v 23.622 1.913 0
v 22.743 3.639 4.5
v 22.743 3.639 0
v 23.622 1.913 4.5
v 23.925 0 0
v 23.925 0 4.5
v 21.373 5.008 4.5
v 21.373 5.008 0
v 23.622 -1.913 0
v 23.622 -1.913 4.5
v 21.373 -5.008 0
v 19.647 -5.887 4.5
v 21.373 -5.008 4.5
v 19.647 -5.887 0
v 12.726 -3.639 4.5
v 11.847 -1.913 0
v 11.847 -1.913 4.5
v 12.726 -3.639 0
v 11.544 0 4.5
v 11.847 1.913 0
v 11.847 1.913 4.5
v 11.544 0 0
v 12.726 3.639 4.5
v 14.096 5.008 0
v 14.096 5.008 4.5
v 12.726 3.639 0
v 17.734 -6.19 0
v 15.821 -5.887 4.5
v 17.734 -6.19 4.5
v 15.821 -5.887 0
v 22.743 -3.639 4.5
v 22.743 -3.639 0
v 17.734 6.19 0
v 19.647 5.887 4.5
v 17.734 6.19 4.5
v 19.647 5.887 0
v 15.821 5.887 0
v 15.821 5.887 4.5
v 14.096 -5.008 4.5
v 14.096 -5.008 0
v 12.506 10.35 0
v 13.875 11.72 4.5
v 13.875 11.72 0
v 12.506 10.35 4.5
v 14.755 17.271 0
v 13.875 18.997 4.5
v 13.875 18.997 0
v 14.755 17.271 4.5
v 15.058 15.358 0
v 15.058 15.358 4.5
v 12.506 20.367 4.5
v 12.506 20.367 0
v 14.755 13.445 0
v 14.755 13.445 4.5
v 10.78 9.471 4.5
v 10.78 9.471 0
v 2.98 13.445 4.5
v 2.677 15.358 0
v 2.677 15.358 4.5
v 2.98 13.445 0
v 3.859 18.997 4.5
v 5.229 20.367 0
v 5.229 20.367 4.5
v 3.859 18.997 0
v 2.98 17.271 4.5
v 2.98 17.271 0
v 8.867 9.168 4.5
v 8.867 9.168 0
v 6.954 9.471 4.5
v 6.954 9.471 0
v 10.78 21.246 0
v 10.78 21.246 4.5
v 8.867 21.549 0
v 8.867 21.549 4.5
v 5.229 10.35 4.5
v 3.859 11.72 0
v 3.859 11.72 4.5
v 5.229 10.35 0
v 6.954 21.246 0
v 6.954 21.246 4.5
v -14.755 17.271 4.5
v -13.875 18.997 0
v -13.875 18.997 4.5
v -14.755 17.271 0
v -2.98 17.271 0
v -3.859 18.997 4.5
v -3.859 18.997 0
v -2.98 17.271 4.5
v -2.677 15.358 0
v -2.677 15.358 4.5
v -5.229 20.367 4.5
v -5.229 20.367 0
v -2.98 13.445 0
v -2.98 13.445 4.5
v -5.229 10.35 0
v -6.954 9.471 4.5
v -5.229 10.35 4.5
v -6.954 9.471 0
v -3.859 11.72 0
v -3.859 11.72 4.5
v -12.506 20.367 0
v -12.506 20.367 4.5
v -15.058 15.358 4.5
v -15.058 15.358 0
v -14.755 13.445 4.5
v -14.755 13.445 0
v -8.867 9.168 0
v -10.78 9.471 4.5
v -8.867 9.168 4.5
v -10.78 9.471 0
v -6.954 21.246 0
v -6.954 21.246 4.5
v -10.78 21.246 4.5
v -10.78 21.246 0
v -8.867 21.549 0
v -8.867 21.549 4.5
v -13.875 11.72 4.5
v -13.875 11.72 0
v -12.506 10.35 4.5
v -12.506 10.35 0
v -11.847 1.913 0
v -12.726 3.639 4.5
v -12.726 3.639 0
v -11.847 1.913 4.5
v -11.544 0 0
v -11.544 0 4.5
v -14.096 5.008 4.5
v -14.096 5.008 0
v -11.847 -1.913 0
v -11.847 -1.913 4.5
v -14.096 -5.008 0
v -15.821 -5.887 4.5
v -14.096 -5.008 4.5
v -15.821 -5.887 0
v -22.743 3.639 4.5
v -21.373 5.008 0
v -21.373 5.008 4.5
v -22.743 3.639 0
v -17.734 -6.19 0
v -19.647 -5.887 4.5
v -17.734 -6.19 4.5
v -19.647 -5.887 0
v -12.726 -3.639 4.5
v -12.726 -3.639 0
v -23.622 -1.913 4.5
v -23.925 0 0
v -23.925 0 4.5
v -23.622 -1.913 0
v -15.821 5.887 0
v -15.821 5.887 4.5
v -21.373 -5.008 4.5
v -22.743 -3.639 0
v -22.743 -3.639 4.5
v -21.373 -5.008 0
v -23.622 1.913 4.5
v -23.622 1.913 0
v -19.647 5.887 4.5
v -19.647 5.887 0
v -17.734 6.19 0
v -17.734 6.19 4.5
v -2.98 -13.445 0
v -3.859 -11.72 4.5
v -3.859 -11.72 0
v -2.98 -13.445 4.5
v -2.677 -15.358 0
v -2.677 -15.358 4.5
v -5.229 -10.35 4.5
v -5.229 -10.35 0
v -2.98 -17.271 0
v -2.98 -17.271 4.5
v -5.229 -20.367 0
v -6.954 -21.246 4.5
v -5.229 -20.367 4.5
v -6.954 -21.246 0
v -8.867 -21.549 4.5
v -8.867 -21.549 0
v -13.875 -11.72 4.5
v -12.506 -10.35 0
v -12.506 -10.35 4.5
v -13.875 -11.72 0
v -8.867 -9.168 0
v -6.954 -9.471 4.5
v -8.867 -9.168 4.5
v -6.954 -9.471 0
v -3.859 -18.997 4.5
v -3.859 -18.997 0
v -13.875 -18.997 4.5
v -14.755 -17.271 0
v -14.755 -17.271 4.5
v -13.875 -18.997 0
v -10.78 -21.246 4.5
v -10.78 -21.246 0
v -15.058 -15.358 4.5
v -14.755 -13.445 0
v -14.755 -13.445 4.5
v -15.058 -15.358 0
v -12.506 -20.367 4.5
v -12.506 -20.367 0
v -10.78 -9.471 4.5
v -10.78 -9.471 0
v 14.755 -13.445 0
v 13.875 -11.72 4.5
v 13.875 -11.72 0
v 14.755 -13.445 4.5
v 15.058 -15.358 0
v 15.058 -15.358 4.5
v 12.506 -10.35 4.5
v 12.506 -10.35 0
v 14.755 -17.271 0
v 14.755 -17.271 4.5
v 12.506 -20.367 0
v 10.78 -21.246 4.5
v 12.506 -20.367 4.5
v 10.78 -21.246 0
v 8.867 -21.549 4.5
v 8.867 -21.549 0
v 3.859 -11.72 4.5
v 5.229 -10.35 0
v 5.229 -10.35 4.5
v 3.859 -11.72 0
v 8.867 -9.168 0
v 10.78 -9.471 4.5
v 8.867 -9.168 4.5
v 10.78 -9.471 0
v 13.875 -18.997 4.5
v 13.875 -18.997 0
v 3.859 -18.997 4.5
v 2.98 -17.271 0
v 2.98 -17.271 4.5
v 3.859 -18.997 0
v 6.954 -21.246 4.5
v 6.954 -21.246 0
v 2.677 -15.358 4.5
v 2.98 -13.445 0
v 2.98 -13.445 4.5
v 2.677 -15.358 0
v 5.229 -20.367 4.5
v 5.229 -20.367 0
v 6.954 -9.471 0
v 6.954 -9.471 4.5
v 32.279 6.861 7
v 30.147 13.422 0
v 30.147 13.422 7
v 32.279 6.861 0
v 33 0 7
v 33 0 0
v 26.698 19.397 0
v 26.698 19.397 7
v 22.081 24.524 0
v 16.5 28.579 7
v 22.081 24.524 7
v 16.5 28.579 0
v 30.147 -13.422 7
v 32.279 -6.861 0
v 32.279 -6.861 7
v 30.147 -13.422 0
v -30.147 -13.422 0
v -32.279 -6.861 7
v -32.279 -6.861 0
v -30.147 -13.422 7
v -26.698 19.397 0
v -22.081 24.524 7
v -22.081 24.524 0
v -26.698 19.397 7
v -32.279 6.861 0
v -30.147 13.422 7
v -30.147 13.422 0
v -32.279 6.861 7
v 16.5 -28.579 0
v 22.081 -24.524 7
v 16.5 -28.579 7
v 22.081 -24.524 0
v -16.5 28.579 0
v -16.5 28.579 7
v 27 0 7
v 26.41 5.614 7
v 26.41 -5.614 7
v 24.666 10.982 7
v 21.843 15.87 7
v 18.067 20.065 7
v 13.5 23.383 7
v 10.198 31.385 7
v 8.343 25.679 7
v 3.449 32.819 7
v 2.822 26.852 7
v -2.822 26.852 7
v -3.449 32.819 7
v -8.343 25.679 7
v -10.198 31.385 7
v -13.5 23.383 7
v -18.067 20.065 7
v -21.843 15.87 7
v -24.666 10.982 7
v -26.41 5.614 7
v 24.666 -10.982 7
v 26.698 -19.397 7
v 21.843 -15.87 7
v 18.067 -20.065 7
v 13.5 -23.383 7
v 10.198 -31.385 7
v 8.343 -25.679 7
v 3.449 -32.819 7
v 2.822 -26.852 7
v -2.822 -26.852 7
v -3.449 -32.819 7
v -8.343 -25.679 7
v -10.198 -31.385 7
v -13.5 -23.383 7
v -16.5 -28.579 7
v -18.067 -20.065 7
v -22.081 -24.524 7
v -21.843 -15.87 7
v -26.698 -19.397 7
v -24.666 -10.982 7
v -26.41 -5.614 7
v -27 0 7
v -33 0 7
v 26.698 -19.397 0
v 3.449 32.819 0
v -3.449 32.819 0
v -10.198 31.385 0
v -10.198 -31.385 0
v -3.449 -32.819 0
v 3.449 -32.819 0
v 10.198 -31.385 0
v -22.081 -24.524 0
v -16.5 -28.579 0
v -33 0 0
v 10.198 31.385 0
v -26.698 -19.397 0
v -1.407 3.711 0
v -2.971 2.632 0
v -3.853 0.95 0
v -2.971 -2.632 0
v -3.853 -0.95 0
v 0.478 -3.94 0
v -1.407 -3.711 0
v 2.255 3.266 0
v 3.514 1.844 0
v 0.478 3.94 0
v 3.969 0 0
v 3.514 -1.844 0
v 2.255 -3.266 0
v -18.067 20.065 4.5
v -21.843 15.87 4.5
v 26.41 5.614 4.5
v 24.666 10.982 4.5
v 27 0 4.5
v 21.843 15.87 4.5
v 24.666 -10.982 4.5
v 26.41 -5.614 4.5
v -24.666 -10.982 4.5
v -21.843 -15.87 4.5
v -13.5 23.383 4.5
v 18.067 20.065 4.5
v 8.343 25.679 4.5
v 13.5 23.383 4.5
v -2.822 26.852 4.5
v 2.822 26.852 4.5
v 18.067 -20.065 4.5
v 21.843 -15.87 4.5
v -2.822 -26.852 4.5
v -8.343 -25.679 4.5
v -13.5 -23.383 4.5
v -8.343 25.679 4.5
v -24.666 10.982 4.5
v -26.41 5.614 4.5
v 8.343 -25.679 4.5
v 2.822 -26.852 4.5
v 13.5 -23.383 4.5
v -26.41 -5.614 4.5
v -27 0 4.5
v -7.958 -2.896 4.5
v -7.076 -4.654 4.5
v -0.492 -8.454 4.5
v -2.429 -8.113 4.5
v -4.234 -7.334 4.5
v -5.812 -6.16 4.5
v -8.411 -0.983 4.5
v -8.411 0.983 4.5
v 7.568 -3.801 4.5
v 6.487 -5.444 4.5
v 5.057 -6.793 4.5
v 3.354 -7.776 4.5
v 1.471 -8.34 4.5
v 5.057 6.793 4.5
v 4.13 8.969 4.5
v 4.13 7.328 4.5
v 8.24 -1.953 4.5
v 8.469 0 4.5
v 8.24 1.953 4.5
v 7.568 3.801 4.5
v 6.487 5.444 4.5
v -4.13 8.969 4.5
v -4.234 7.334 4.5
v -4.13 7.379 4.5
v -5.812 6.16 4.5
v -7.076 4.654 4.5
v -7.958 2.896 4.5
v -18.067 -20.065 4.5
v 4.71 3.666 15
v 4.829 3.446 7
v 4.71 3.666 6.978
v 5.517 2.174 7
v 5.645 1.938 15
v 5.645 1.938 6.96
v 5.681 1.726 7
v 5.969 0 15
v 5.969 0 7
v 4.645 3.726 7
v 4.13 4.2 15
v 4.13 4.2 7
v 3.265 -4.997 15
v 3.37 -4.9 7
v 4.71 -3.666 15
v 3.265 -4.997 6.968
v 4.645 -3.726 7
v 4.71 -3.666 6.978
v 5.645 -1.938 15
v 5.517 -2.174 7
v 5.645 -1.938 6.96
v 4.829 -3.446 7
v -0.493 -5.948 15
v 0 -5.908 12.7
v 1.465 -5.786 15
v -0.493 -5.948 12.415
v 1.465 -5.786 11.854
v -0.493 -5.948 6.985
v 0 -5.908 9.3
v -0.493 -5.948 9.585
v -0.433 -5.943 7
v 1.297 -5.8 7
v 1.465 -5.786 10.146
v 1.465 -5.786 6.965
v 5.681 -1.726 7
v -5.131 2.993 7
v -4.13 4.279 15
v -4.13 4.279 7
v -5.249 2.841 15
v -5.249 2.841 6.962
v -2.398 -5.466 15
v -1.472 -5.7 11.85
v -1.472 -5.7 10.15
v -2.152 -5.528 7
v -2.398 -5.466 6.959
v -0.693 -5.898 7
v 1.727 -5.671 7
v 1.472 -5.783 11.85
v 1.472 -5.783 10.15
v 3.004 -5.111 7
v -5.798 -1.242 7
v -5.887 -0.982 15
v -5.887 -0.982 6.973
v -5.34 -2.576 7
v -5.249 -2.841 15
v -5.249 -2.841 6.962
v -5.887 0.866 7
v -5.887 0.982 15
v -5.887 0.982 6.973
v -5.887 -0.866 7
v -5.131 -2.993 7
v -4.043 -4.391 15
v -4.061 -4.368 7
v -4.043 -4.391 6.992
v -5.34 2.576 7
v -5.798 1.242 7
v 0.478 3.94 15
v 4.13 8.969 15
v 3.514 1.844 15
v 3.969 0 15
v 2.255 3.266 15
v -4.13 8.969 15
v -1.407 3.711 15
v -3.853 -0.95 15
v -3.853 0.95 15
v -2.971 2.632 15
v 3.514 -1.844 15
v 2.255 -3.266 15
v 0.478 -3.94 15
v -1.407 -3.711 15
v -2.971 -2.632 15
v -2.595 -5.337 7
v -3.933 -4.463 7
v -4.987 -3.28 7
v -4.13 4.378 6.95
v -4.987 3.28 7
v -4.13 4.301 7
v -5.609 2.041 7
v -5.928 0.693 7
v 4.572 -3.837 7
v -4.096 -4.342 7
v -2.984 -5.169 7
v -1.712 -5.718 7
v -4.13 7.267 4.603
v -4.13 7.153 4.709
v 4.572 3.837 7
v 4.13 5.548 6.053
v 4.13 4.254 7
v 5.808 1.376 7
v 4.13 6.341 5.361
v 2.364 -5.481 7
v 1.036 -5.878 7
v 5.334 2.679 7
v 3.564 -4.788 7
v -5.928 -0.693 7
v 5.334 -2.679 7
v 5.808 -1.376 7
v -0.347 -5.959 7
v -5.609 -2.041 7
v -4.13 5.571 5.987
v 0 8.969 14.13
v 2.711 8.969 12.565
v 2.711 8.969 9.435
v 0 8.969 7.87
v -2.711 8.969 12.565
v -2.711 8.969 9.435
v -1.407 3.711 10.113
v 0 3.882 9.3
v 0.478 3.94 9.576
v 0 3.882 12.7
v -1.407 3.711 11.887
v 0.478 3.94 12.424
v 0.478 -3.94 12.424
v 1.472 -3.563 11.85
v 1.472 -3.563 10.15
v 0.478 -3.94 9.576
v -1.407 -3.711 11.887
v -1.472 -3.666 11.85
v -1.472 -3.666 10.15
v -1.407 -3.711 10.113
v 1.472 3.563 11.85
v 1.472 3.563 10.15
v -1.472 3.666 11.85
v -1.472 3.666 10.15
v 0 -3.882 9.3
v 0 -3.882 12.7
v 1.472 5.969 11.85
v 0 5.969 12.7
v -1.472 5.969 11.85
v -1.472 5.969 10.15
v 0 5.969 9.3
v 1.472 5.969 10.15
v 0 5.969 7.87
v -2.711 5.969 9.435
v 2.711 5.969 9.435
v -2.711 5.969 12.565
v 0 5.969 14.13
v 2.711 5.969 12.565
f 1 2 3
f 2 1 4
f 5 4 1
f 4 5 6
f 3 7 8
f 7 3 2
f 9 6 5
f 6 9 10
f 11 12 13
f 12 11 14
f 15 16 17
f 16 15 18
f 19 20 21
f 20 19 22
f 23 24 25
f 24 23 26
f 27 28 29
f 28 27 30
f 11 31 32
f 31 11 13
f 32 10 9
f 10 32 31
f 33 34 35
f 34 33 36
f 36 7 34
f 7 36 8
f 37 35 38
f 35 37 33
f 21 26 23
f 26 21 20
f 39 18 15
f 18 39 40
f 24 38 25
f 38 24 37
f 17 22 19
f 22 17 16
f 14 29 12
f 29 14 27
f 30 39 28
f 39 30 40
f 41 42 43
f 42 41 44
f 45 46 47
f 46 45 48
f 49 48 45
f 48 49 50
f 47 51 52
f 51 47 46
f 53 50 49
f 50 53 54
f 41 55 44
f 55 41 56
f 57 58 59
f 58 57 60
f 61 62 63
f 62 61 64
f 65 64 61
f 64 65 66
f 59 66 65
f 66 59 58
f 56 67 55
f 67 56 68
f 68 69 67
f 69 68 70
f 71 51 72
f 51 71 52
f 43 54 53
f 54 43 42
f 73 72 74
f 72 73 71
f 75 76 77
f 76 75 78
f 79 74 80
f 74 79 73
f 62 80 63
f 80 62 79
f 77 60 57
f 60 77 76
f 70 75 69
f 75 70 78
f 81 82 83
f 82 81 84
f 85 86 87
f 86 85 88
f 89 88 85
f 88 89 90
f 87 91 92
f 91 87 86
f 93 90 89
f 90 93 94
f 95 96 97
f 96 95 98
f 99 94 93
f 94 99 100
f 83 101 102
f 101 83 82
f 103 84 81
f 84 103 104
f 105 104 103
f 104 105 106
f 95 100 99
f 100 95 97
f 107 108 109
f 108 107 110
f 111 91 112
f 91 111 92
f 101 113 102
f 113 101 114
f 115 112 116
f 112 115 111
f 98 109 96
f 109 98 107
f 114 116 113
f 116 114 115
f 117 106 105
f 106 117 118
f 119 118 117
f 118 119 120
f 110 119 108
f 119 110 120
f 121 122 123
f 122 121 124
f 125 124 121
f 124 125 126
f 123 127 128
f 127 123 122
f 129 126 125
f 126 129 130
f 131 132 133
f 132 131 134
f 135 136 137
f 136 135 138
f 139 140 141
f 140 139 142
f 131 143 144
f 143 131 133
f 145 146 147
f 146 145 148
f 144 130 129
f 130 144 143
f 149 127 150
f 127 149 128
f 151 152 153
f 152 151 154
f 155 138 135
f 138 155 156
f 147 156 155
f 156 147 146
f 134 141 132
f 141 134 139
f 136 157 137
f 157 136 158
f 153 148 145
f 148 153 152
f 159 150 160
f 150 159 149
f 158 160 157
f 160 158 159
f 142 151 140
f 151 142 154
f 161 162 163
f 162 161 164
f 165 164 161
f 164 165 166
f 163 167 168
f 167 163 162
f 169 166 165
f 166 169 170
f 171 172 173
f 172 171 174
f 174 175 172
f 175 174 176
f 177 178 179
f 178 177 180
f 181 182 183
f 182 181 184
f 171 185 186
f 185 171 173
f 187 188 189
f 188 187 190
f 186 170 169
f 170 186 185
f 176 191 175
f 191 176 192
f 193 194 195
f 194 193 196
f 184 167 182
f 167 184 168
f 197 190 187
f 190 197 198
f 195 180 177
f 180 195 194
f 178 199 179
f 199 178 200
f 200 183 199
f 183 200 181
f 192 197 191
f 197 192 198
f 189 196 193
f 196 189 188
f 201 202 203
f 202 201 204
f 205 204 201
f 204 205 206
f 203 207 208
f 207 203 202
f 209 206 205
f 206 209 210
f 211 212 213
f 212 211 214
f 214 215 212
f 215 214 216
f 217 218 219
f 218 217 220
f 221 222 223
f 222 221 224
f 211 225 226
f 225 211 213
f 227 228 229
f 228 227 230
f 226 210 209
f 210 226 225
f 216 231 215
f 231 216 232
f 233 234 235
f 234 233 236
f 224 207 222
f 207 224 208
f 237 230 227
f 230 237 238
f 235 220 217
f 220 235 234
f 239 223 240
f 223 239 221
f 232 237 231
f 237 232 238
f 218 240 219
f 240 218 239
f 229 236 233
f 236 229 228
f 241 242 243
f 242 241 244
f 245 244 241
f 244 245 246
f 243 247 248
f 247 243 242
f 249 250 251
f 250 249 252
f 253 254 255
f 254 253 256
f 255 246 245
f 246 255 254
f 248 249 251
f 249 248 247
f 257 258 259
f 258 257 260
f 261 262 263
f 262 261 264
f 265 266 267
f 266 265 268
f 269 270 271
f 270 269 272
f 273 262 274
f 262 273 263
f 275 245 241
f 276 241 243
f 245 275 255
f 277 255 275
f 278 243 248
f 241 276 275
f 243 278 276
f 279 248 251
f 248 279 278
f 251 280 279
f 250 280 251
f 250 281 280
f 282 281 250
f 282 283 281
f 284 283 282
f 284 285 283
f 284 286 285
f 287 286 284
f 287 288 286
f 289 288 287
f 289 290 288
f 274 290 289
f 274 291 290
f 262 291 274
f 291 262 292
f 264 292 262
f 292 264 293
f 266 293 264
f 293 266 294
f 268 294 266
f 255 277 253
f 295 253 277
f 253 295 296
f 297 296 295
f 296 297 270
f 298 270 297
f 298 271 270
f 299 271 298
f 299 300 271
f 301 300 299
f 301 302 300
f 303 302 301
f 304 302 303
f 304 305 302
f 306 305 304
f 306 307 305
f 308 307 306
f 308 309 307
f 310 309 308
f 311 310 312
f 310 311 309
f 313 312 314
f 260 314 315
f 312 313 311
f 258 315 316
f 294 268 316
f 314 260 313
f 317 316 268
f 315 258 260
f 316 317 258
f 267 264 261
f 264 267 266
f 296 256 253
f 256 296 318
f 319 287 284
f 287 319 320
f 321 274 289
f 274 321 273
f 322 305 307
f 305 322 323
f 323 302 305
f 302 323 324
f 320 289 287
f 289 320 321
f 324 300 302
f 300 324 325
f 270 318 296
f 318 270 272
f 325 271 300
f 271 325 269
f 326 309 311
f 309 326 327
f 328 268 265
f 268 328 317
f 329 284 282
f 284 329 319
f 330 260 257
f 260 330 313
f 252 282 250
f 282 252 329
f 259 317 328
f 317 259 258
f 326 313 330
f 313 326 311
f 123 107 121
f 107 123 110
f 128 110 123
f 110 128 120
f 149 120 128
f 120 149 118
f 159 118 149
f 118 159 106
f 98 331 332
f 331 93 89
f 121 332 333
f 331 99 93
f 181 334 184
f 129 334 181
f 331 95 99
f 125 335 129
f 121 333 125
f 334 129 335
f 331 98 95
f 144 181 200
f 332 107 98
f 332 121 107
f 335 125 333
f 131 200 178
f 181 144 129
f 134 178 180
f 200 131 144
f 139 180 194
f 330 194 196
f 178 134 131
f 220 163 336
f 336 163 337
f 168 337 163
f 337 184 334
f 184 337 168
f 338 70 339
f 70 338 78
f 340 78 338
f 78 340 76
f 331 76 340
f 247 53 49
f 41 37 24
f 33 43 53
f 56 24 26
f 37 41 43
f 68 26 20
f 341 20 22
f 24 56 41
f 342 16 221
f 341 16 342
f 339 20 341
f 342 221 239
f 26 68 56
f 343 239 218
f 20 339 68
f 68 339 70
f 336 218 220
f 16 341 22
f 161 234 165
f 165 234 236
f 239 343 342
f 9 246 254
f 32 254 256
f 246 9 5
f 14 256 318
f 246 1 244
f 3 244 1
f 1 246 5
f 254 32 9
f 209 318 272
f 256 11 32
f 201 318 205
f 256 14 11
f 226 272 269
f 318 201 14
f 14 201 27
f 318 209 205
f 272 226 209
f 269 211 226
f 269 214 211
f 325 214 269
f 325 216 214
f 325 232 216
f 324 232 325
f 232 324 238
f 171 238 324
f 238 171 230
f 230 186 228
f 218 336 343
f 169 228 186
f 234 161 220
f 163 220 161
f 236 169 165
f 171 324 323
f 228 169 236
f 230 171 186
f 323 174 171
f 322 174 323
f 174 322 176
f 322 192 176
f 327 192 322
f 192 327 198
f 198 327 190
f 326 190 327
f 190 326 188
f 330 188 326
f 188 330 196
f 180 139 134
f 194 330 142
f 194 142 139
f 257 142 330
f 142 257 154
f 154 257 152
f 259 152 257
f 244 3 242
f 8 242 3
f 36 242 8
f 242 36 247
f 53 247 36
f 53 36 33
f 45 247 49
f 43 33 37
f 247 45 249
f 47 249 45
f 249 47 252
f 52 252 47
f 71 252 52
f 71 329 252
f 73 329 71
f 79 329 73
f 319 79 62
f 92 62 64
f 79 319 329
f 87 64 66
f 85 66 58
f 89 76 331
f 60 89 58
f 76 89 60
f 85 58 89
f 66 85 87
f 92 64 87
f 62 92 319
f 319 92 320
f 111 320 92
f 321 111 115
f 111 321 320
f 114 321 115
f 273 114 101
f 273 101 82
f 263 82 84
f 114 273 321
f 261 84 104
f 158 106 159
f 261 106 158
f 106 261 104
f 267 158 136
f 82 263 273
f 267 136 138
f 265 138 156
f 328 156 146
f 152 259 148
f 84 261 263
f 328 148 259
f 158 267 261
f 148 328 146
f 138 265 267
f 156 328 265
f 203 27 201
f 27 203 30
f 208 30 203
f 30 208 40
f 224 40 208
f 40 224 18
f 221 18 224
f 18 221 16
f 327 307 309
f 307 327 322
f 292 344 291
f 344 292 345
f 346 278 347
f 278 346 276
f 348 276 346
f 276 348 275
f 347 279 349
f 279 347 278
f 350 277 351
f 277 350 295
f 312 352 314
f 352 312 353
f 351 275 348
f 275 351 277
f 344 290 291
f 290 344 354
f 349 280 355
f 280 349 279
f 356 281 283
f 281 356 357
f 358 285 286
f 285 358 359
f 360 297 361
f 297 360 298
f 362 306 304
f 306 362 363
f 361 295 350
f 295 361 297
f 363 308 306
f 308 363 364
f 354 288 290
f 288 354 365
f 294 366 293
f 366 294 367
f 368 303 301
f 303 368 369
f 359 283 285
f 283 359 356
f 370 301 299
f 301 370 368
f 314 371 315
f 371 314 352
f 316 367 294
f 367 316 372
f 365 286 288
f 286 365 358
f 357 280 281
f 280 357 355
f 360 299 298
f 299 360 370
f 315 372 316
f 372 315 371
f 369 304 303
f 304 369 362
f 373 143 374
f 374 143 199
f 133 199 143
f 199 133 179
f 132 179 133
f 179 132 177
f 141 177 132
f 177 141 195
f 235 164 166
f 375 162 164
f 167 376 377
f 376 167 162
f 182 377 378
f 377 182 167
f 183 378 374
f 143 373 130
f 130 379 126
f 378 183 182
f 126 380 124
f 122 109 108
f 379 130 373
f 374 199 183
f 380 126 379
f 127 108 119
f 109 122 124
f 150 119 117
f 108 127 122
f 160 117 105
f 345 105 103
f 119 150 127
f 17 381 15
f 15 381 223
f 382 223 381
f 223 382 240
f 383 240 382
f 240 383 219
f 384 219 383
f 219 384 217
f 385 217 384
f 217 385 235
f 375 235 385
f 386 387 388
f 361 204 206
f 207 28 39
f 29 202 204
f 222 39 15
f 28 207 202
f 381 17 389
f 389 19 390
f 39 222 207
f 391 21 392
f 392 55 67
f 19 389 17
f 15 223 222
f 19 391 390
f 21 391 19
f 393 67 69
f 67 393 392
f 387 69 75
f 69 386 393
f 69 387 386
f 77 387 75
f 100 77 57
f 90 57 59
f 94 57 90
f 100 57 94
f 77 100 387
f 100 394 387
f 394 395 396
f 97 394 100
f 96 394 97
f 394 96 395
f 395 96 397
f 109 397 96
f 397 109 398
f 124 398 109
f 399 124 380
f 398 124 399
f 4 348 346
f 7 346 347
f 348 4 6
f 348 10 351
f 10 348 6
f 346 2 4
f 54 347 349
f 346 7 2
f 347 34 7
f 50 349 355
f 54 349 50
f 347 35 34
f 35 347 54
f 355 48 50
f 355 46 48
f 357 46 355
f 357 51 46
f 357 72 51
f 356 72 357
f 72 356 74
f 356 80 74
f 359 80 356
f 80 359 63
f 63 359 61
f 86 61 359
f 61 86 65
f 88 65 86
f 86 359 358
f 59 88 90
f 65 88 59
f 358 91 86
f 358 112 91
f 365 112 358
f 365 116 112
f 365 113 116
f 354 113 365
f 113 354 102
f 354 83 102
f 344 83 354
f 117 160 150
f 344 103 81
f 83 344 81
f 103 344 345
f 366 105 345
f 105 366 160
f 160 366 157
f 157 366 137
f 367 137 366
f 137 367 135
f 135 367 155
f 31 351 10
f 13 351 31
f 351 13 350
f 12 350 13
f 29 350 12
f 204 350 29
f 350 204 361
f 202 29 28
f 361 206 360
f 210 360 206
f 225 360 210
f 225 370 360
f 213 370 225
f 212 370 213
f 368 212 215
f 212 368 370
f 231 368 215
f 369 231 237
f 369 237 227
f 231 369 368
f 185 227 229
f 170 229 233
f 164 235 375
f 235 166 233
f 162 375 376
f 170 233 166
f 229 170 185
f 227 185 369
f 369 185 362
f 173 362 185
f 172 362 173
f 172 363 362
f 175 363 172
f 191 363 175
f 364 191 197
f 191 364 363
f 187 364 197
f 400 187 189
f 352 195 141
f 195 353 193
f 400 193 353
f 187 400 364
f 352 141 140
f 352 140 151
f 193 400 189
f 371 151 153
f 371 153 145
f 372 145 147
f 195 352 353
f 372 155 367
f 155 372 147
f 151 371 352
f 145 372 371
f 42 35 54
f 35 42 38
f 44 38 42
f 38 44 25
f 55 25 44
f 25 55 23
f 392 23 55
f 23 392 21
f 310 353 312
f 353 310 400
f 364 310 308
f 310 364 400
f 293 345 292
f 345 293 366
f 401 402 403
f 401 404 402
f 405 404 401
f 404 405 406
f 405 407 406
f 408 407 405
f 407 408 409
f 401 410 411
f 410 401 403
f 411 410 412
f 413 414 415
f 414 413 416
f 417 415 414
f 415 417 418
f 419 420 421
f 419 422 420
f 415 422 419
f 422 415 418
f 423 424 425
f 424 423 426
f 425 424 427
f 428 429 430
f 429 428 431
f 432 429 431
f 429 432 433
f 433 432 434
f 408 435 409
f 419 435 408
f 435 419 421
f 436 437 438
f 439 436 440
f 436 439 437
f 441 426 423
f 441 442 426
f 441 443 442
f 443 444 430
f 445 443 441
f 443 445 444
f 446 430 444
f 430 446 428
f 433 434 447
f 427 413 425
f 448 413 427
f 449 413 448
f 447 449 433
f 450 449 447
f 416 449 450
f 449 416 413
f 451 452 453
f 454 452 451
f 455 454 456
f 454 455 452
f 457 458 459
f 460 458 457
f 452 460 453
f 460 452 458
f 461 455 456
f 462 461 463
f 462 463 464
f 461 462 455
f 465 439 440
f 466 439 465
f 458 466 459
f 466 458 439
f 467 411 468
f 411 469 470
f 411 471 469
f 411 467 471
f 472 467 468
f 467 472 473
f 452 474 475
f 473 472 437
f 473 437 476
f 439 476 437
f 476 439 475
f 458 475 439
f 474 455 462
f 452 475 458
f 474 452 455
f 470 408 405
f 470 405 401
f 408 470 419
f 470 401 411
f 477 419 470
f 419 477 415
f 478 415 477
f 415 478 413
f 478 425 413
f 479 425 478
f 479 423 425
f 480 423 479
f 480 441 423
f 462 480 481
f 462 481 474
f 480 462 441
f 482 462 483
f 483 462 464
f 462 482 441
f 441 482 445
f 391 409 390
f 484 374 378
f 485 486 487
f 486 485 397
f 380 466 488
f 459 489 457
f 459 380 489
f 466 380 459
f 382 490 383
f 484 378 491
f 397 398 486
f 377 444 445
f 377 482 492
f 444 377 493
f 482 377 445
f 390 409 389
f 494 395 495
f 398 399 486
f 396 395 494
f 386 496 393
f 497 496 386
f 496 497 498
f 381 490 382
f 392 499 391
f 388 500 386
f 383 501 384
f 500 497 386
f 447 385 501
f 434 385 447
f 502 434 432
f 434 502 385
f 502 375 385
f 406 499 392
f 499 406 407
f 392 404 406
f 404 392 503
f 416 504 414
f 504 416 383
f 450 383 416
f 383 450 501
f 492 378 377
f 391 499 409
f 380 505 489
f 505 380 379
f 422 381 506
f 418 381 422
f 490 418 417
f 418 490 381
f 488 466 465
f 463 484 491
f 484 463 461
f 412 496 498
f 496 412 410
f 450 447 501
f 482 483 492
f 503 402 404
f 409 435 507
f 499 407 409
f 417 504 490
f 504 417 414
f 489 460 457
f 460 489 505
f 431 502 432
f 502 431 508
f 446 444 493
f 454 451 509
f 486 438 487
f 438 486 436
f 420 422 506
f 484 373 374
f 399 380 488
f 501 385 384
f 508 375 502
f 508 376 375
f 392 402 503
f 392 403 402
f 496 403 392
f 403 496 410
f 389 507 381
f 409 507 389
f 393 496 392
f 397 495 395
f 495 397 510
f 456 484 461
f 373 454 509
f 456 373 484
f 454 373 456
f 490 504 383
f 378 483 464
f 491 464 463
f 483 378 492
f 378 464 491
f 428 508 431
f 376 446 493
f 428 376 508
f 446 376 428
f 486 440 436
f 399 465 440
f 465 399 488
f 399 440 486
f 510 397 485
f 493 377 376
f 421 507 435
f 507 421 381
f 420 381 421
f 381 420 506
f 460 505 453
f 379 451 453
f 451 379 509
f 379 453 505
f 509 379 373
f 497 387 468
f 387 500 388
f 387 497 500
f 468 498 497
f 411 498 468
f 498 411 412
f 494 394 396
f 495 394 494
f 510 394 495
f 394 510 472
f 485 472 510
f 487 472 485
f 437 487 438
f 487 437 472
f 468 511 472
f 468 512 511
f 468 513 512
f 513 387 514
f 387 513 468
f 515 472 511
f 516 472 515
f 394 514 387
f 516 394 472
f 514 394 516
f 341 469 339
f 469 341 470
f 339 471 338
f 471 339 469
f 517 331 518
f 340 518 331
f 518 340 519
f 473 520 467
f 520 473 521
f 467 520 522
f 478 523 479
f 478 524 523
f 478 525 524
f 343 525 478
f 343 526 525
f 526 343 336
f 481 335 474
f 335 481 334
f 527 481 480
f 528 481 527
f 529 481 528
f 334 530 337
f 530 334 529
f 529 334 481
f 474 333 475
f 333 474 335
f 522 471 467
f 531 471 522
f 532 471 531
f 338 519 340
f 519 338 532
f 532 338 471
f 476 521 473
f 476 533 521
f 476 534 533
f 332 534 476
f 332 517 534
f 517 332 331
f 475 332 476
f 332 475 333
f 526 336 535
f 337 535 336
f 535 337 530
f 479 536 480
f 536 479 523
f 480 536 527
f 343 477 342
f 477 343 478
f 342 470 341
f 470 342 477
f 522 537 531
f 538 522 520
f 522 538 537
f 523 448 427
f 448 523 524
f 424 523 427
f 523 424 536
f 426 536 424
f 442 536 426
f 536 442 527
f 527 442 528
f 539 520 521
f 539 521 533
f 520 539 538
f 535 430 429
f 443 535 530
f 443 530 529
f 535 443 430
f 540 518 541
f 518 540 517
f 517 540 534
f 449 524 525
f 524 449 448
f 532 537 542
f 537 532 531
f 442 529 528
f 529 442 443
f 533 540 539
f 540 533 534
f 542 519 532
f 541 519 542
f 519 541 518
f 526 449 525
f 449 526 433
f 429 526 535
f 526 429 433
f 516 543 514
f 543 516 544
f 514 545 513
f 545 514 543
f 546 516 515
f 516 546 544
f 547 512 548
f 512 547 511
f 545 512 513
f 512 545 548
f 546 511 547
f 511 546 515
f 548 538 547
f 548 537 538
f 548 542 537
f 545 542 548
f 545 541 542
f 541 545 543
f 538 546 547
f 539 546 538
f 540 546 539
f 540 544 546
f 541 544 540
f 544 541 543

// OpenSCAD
// file: constants.scad
/* sinusoid-plotter: A parametric sinusoid plotter made with OpenSCAD.
 * Copyright (C) 2013  Clayton G. Hobbs
 * 
 * This program is free software: you can redistribute it and/or modify
 * it under the terms of the GNU General Public License as published by
 * the Free Software Foundation, either version 3 of the License, or
 * (at your option) any later version.
 * 
 * This program is distributed in the hope that it will be useful,
 * but WITHOUT ANY WARRANTY; without even the implied warranty of
 * MERCHANTABILITY or FITNESS FOR A PARTICULAR PURPOSE.  See the
 * GNU General Public License for more details.
 * 
 * You should have received a copy of the GNU General Public License
 * along with this program.  If not, see <http://www.gnu.org/licenses/>.
 */

pi = 3.1415926535897932384626433832795;
// main file
/* sinusoid-plotter: A parametric sinusoid plotter made with OpenSCAD.
 * Copyright (C) 2013  Clayton G. Hobbs
 * 
 * This program is free software: you can redistribute it and/or modify
 * it under the terms of the GNU General Public License as published by
 * the Free Software Foundation, either version 3 of the License, or
 * (at your option) any later version.
 * 
 * This program is distributed in the hope that it will be useful,
 * but WITHOUT ANY WARRANTY; without even the implied warranty of
 * MERCHANTABILITY or FITNESS FOR A PARTICULAR PURPOSE.  See the
 * GNU General Public License for more details.
 * 
 * You should have received a copy of the GNU General Public License
 * along with this program.  If not, see <http://www.gnu.org/licenses/>.
 */

include <constants.scad>;

module wheel(radius, height, rim_thickness, rim_height, axle_radius,
             axle_depth, axle_wall, axle_closed=false, axle_pin, nut_radius,
             nut_thickness, holes=6, hole_radius_factor=4/3)
{
	// Calculations for the holes in the disk
	middle_radius = (radius - rim_thickness + axle_radius + axle_wall +
                     rim_height)/2;
	hole_radius = hole_radius_factor*pi*middle_radius/(holes*2);

	difference() {
		union() {
			difference() {
				// Wheel body
				cylinder(r = radius, h = height);

				// Cutout on axle side to save plastic
				translate([0, 0, height - rim_height])
				cylinder(r = radius - rim_thickness, h = height);

				// Holes through the wheel to save plastic
				for(x = [0:holes-1]) {
					translate([cos(360*x/holes)*middle_radius,
							   sin(360*x/holes)*middle_radius, -.5])
					cylinder(r = hole_radius, h = height + 1);
				}
			}

			// Axle shaft
			if (axle_closed == false) {
				cylinder(r = axle_radius + axle_wall, h = axle_depth);
			} else {
				cylinder(r = axle_radius + axle_wall,
                         h = axle_depth + axle_wall);
			}

			// Axle flange
			translate([0, 0, height - rim_height])
			cylinder(r1 = axle_radius + axle_wall + rim_height,
                     r2 = axle_radius + axle_wall, h = rim_height);

			// Nut trap body
			translate([-nut_radius - 1, axle_radius, 0])
			if (axle_closed == false) {
				cube([2*nut_radius + 2, axle_wall + nut_thickness, axle_depth]);
			} else {
				cube([2*nut_radius + 2, axle_wall + nut_thickness,
                      axle_depth + axle_wall]);
			}
		}

		// Axle hole
		translate([0, 0, -1])
		if (axle_closed == false) {
			cylinder(r = axle_radius, h = axle_depth + 2);
		} else {
			cylinder(r = axle_radius, h = axle_depth + 1);
		}

		// Perpendicular axle hole
		translate([0, 0, (axle_depth - height)/2 + height])
		rotate([90, 30, 0])
		cylinder(r = axle_pin, h = 2*(axle_radius + axle_wall)+1, center=true);

		// Axle nut trap
		translate([0, axle_radius + axle_wall,
                   (axle_depth - height)/2 + height])
		rotate([-90, 30, 0])
		cylinder(r = nut_radius, h = nut_thickness + 1, $fn=6);
	}
}

wheel(radius = 33, height = 7, rim_thickness = 6, rim_height = 2.5,
      axle_radius = 3.96875, axle_depth = 15, axle_wall = 2, axle_pin = 1.7,
      nut_radius = 3.13, nut_thickness = 3);
